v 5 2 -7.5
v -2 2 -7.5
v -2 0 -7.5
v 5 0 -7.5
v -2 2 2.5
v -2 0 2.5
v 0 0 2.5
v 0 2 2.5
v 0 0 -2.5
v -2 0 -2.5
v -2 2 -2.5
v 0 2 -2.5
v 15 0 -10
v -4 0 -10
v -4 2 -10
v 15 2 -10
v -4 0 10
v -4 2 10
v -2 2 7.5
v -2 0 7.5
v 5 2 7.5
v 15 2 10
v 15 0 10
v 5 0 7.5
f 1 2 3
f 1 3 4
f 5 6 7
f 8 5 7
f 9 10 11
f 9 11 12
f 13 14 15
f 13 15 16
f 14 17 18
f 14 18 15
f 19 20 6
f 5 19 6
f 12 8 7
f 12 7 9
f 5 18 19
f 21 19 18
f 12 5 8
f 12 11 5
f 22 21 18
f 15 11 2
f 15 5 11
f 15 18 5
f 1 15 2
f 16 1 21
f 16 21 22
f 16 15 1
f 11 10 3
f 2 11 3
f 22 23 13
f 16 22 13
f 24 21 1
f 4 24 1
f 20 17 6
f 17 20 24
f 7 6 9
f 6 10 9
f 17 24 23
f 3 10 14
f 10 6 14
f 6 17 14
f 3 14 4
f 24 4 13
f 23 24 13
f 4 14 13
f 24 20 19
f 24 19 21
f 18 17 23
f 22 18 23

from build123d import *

# Parameters (mm, degrees)
SKETCH1_W           = 19
SKETCH1_H           = 20
SKETCH1_W_2         = 2
SKETCH1_H_2         = 5
BOSS_EXTRUDE1_DEPTH = 2
SKETCH2_W           = 5
SKETCH2_H           = 15
CUT_EXTRUDE1_DEPTH  = 10


with BuildPart() as part:
    # Sketch1 → Boss-Extrude1 (new body)
    with BuildSketch(Plane(origin=(0, 0, 0), x_dir=(1, 0, 0), z_dir=(0, 1, 0))):
        with Locations((5.5, 0)):
            Rectangle(SKETCH1_W, SKETCH1_H)
        with Locations((-1, 5)):
            Rectangle(SKETCH1_W_2, SKETCH1_H_2, mode=Mode.SUBTRACT)
        with Locations((-1, -5)):
            Rectangle(SKETCH1_W_2, SKETCH1_H_2, mode=Mode.SUBTRACT)
    extrude(amount=BOSS_EXTRUDE1_DEPTH)

    # Sketch2 → Cut-Extrude1 (cut)
    with BuildSketch(Plane(origin=(0, 2, 0), x_dir=(1, 0, 0), z_dir=(0, 1, 0))):
        with Locations((2.5, 0)):
            Rectangle(SKETCH2_W, SKETCH2_H)
    extrude(amount=-CUT_EXTRUDE1_DEPTH, mode=Mode.SUBTRACT)


solid = part.part
